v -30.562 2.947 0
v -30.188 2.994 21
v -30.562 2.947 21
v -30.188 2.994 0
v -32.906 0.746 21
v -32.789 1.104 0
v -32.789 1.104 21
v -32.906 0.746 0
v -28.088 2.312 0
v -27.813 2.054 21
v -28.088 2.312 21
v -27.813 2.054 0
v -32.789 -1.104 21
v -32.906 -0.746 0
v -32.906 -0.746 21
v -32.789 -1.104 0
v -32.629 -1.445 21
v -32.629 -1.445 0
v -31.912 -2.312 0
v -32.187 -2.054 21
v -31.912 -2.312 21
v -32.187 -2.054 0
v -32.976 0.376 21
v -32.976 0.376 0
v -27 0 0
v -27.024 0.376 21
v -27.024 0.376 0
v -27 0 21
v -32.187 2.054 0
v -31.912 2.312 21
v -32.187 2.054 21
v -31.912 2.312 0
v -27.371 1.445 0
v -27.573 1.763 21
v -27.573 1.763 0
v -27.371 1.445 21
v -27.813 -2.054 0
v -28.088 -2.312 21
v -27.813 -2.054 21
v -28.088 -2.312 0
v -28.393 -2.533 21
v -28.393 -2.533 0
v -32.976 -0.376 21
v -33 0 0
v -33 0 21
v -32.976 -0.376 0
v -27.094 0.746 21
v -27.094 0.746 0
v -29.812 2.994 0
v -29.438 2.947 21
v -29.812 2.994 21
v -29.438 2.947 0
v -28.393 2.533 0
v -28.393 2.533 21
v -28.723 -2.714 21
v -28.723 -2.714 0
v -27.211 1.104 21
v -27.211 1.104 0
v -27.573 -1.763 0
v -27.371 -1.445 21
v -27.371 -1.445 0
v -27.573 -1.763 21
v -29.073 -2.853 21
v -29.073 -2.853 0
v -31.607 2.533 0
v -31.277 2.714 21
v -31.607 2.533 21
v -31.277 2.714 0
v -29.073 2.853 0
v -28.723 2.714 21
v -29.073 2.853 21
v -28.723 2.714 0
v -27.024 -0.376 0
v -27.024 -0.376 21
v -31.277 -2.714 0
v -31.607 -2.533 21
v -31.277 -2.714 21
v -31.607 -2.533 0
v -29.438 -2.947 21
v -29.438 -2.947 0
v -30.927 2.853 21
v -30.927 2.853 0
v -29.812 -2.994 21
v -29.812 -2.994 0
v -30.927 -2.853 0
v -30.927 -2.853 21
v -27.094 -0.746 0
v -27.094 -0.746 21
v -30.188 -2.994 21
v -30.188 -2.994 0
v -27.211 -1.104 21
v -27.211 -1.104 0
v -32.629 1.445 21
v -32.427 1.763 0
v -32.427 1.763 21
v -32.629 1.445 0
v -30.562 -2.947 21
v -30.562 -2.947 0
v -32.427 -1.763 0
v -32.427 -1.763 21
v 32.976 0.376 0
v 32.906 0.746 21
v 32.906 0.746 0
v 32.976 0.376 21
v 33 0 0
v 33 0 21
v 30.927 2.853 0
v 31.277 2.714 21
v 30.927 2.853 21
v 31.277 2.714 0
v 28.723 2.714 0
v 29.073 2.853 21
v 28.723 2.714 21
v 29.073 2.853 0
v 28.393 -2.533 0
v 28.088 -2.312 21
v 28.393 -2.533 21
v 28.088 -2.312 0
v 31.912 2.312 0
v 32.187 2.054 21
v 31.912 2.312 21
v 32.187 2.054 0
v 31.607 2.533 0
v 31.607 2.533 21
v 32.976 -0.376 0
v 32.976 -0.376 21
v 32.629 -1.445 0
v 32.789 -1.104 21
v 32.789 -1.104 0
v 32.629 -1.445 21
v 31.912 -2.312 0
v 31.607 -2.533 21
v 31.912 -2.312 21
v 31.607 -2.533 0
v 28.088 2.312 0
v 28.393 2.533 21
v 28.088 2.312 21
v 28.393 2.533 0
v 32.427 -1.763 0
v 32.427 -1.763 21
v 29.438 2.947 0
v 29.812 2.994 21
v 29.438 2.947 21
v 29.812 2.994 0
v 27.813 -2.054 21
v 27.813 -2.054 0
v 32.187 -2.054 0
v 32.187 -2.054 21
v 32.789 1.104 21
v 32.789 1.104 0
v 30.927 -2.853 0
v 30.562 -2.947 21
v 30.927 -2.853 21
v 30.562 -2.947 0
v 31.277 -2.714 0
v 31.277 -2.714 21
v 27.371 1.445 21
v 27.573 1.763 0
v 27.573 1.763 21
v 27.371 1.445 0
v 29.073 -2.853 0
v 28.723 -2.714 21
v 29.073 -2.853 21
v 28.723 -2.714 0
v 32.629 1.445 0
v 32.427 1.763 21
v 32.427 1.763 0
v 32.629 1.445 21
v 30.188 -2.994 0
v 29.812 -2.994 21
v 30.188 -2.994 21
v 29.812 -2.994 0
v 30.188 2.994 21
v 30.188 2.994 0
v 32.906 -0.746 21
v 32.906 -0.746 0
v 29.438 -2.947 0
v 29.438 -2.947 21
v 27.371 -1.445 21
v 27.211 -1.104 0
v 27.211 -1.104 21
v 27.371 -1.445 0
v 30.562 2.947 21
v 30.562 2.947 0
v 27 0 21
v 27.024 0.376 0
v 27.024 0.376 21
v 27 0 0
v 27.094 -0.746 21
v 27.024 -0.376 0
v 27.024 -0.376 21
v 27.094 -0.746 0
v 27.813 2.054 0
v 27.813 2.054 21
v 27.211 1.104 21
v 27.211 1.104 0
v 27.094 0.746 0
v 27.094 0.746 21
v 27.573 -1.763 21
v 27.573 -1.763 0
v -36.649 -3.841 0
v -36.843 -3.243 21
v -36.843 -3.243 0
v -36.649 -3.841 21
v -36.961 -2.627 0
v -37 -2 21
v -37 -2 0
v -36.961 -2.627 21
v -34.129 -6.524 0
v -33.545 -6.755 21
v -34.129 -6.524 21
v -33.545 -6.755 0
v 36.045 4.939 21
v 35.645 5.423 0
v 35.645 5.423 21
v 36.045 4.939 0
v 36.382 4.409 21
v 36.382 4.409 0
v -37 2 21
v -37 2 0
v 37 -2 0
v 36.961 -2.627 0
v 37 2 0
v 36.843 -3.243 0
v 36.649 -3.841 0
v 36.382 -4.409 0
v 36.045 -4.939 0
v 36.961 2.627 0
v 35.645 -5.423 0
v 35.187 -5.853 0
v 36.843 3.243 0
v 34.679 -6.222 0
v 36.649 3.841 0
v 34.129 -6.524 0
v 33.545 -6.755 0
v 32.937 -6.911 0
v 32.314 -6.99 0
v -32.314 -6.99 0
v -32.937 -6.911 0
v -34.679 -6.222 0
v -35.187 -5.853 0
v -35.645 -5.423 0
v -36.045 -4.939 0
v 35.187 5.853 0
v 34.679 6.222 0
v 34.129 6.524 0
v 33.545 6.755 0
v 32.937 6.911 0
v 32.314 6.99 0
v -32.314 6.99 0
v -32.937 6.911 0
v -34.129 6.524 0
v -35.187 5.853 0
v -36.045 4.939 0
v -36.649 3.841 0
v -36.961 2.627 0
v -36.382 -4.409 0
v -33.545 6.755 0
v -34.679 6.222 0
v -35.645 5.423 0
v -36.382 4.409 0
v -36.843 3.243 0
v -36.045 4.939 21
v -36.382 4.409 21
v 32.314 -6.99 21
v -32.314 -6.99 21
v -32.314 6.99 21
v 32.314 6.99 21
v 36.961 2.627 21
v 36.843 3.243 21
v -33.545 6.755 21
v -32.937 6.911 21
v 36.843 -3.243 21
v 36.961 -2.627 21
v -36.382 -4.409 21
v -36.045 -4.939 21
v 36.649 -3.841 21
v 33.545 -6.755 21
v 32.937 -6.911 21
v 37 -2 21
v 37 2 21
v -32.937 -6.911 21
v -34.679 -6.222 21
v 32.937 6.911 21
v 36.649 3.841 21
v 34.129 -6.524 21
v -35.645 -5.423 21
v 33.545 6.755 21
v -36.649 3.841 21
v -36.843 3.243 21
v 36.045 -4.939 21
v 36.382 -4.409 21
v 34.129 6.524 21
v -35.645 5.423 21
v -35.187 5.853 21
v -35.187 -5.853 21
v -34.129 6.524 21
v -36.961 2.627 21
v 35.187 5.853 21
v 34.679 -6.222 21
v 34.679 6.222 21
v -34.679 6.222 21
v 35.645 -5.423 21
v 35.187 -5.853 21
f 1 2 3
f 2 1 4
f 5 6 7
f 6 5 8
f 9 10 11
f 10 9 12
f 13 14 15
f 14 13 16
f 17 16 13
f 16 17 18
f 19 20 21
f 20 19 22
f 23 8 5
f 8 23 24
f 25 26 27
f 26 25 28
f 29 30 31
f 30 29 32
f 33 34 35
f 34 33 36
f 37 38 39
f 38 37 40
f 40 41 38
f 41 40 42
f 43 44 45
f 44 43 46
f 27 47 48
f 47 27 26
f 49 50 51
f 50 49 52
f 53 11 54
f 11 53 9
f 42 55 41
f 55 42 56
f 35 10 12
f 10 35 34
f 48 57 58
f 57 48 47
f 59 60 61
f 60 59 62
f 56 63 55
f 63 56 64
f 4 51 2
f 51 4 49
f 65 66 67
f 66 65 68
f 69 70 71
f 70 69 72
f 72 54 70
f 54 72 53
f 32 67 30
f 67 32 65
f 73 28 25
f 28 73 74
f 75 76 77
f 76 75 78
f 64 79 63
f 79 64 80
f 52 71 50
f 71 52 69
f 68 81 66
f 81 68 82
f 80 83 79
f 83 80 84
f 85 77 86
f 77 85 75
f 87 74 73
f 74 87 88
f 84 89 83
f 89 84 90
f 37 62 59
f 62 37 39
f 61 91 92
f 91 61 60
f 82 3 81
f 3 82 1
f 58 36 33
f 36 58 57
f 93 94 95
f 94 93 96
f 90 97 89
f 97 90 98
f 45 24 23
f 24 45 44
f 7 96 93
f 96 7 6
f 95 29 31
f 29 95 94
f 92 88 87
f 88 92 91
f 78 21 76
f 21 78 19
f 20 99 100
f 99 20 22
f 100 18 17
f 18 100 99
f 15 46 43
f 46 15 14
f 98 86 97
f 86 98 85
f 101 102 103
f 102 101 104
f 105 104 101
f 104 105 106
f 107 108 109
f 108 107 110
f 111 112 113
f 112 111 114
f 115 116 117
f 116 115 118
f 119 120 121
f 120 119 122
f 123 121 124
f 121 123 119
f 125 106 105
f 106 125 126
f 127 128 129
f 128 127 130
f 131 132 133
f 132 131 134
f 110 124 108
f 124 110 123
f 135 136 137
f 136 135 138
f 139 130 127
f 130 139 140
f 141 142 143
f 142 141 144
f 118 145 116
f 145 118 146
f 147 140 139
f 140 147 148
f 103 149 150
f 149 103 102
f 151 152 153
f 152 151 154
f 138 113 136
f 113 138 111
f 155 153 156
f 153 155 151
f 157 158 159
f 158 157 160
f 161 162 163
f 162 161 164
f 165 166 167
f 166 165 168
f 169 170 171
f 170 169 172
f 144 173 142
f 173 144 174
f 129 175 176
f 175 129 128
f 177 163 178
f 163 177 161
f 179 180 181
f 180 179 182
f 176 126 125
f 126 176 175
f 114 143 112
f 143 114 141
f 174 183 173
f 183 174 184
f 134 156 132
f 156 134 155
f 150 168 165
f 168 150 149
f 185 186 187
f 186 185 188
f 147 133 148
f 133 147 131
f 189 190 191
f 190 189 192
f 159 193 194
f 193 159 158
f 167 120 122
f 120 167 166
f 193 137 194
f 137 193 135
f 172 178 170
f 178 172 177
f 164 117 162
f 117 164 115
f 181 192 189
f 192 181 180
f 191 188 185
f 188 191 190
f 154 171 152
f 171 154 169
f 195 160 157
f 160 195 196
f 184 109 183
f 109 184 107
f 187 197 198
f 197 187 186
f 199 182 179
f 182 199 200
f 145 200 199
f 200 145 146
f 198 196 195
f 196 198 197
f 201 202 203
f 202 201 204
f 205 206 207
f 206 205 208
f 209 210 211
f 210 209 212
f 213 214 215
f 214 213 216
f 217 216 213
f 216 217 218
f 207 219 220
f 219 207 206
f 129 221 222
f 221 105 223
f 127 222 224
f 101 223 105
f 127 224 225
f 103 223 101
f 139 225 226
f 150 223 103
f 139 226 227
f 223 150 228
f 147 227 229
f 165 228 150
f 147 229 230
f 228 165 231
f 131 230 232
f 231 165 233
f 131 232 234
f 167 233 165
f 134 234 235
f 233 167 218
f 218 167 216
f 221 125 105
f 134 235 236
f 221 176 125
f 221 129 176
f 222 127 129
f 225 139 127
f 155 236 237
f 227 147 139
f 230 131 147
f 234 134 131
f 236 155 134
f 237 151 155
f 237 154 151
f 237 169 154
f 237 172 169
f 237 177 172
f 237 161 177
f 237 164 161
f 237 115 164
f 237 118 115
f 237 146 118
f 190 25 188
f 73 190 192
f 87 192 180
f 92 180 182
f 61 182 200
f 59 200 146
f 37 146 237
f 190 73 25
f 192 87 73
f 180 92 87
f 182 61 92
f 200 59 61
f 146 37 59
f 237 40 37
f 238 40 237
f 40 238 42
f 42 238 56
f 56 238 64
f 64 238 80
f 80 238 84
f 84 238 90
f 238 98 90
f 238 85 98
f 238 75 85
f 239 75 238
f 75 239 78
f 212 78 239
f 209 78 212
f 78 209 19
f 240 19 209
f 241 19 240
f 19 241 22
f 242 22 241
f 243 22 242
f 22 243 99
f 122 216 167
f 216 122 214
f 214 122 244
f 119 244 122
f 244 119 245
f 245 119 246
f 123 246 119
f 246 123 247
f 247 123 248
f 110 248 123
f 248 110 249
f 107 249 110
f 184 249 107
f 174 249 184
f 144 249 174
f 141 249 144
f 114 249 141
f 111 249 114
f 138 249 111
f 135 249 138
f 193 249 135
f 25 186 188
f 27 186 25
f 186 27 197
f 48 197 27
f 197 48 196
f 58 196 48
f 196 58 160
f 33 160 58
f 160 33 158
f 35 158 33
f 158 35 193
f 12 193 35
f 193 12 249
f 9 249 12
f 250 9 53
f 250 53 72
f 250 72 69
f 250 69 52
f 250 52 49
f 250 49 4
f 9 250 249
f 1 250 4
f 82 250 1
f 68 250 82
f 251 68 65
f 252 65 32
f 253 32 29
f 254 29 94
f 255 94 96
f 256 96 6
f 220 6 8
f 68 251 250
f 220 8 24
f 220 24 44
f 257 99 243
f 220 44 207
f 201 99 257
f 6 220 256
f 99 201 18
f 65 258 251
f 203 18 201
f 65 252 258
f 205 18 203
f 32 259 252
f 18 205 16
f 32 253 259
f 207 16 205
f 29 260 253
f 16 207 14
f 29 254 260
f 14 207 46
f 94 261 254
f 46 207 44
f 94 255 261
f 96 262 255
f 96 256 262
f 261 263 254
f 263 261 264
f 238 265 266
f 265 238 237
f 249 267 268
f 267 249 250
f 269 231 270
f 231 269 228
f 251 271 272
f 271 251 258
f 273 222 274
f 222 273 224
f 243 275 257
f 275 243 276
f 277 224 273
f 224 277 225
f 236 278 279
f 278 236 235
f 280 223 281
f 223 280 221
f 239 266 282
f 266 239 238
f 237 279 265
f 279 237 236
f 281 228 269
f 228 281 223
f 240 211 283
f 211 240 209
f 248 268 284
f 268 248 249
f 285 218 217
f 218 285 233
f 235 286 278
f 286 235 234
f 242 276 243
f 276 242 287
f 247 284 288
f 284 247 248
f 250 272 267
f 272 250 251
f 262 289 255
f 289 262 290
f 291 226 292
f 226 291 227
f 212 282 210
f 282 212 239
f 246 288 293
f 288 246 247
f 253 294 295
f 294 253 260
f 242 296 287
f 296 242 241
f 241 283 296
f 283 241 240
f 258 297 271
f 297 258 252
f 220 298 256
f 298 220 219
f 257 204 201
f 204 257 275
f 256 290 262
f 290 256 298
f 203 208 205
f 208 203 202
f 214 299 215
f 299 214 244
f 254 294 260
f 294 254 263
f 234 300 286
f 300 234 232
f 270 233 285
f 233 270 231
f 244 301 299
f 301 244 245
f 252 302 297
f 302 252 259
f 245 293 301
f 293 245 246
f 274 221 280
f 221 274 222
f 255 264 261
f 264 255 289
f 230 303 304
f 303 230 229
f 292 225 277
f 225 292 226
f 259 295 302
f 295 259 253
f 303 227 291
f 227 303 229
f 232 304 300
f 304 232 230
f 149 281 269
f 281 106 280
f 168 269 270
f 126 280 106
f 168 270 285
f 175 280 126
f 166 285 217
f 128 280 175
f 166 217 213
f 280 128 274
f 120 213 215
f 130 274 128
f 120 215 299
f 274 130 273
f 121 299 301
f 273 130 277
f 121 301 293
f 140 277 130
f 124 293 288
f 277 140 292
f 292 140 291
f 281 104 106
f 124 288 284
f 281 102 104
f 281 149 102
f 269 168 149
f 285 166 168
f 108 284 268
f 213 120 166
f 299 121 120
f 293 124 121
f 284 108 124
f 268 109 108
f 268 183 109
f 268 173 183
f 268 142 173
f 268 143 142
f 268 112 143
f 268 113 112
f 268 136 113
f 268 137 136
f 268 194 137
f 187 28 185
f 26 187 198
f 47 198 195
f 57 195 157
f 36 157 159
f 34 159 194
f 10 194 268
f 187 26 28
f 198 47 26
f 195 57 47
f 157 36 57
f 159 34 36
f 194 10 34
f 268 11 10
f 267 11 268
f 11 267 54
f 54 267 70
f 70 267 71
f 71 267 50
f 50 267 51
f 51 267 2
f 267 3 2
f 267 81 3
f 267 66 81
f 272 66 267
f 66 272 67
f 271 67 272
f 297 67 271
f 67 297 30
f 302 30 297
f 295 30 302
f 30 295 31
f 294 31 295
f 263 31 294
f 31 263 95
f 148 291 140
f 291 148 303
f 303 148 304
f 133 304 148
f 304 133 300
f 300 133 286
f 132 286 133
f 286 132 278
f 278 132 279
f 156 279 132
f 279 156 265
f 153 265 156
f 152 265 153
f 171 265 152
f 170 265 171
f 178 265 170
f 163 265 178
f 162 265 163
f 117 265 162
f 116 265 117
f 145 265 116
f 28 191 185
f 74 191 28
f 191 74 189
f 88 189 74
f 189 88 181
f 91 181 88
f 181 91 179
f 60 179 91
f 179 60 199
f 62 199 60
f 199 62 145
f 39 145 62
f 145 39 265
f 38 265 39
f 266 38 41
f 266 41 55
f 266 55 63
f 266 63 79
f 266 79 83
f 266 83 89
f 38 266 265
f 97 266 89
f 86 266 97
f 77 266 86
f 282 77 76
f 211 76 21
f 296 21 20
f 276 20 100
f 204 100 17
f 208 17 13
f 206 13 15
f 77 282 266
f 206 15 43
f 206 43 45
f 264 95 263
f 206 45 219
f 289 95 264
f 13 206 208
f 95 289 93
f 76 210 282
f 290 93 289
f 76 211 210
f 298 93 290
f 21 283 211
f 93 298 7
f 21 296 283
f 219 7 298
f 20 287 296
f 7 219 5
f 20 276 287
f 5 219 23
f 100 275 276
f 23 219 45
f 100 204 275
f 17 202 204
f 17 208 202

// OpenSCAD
$fn = 50;


difference() {
	union() {
		hull() {
			translate(v = [-32.0000000000, 2.0000000000, 0]) {
				cylinder(h = 21, r = 5);
			}
			translate(v = [32.0000000000, 2.0000000000, 0]) {
				cylinder(h = 21, r = 5);
			}
			translate(v = [-32.0000000000, -2.0000000000, 0]) {
				cylinder(h = 21, r = 5);
			}
			translate(v = [32.0000000000, -2.0000000000, 0]) {
				cylinder(h = 21, r = 5);
			}
		}
	}
	union() {
		translate(v = [-30.0000000000, 0.0000000000, -100.0000000000]) {
			cylinder(h = 200, r = 3.0000000000);
		}
		translate(v = [-30.0000000000, 0.0000000000, -100.0000000000]) {
			cylinder(h = 200, r = 3.0000000000);
		}
		translate(v = [30.0000000000, 0.0000000000, -100.0000000000]) {
			cylinder(h = 200, r = 3.0000000000);
		}
		translate(v = [30.0000000000, 0.0000000000, -100.0000000000]) {
			cylinder(h = 200, r = 3.0000000000);
		}
	}
}
